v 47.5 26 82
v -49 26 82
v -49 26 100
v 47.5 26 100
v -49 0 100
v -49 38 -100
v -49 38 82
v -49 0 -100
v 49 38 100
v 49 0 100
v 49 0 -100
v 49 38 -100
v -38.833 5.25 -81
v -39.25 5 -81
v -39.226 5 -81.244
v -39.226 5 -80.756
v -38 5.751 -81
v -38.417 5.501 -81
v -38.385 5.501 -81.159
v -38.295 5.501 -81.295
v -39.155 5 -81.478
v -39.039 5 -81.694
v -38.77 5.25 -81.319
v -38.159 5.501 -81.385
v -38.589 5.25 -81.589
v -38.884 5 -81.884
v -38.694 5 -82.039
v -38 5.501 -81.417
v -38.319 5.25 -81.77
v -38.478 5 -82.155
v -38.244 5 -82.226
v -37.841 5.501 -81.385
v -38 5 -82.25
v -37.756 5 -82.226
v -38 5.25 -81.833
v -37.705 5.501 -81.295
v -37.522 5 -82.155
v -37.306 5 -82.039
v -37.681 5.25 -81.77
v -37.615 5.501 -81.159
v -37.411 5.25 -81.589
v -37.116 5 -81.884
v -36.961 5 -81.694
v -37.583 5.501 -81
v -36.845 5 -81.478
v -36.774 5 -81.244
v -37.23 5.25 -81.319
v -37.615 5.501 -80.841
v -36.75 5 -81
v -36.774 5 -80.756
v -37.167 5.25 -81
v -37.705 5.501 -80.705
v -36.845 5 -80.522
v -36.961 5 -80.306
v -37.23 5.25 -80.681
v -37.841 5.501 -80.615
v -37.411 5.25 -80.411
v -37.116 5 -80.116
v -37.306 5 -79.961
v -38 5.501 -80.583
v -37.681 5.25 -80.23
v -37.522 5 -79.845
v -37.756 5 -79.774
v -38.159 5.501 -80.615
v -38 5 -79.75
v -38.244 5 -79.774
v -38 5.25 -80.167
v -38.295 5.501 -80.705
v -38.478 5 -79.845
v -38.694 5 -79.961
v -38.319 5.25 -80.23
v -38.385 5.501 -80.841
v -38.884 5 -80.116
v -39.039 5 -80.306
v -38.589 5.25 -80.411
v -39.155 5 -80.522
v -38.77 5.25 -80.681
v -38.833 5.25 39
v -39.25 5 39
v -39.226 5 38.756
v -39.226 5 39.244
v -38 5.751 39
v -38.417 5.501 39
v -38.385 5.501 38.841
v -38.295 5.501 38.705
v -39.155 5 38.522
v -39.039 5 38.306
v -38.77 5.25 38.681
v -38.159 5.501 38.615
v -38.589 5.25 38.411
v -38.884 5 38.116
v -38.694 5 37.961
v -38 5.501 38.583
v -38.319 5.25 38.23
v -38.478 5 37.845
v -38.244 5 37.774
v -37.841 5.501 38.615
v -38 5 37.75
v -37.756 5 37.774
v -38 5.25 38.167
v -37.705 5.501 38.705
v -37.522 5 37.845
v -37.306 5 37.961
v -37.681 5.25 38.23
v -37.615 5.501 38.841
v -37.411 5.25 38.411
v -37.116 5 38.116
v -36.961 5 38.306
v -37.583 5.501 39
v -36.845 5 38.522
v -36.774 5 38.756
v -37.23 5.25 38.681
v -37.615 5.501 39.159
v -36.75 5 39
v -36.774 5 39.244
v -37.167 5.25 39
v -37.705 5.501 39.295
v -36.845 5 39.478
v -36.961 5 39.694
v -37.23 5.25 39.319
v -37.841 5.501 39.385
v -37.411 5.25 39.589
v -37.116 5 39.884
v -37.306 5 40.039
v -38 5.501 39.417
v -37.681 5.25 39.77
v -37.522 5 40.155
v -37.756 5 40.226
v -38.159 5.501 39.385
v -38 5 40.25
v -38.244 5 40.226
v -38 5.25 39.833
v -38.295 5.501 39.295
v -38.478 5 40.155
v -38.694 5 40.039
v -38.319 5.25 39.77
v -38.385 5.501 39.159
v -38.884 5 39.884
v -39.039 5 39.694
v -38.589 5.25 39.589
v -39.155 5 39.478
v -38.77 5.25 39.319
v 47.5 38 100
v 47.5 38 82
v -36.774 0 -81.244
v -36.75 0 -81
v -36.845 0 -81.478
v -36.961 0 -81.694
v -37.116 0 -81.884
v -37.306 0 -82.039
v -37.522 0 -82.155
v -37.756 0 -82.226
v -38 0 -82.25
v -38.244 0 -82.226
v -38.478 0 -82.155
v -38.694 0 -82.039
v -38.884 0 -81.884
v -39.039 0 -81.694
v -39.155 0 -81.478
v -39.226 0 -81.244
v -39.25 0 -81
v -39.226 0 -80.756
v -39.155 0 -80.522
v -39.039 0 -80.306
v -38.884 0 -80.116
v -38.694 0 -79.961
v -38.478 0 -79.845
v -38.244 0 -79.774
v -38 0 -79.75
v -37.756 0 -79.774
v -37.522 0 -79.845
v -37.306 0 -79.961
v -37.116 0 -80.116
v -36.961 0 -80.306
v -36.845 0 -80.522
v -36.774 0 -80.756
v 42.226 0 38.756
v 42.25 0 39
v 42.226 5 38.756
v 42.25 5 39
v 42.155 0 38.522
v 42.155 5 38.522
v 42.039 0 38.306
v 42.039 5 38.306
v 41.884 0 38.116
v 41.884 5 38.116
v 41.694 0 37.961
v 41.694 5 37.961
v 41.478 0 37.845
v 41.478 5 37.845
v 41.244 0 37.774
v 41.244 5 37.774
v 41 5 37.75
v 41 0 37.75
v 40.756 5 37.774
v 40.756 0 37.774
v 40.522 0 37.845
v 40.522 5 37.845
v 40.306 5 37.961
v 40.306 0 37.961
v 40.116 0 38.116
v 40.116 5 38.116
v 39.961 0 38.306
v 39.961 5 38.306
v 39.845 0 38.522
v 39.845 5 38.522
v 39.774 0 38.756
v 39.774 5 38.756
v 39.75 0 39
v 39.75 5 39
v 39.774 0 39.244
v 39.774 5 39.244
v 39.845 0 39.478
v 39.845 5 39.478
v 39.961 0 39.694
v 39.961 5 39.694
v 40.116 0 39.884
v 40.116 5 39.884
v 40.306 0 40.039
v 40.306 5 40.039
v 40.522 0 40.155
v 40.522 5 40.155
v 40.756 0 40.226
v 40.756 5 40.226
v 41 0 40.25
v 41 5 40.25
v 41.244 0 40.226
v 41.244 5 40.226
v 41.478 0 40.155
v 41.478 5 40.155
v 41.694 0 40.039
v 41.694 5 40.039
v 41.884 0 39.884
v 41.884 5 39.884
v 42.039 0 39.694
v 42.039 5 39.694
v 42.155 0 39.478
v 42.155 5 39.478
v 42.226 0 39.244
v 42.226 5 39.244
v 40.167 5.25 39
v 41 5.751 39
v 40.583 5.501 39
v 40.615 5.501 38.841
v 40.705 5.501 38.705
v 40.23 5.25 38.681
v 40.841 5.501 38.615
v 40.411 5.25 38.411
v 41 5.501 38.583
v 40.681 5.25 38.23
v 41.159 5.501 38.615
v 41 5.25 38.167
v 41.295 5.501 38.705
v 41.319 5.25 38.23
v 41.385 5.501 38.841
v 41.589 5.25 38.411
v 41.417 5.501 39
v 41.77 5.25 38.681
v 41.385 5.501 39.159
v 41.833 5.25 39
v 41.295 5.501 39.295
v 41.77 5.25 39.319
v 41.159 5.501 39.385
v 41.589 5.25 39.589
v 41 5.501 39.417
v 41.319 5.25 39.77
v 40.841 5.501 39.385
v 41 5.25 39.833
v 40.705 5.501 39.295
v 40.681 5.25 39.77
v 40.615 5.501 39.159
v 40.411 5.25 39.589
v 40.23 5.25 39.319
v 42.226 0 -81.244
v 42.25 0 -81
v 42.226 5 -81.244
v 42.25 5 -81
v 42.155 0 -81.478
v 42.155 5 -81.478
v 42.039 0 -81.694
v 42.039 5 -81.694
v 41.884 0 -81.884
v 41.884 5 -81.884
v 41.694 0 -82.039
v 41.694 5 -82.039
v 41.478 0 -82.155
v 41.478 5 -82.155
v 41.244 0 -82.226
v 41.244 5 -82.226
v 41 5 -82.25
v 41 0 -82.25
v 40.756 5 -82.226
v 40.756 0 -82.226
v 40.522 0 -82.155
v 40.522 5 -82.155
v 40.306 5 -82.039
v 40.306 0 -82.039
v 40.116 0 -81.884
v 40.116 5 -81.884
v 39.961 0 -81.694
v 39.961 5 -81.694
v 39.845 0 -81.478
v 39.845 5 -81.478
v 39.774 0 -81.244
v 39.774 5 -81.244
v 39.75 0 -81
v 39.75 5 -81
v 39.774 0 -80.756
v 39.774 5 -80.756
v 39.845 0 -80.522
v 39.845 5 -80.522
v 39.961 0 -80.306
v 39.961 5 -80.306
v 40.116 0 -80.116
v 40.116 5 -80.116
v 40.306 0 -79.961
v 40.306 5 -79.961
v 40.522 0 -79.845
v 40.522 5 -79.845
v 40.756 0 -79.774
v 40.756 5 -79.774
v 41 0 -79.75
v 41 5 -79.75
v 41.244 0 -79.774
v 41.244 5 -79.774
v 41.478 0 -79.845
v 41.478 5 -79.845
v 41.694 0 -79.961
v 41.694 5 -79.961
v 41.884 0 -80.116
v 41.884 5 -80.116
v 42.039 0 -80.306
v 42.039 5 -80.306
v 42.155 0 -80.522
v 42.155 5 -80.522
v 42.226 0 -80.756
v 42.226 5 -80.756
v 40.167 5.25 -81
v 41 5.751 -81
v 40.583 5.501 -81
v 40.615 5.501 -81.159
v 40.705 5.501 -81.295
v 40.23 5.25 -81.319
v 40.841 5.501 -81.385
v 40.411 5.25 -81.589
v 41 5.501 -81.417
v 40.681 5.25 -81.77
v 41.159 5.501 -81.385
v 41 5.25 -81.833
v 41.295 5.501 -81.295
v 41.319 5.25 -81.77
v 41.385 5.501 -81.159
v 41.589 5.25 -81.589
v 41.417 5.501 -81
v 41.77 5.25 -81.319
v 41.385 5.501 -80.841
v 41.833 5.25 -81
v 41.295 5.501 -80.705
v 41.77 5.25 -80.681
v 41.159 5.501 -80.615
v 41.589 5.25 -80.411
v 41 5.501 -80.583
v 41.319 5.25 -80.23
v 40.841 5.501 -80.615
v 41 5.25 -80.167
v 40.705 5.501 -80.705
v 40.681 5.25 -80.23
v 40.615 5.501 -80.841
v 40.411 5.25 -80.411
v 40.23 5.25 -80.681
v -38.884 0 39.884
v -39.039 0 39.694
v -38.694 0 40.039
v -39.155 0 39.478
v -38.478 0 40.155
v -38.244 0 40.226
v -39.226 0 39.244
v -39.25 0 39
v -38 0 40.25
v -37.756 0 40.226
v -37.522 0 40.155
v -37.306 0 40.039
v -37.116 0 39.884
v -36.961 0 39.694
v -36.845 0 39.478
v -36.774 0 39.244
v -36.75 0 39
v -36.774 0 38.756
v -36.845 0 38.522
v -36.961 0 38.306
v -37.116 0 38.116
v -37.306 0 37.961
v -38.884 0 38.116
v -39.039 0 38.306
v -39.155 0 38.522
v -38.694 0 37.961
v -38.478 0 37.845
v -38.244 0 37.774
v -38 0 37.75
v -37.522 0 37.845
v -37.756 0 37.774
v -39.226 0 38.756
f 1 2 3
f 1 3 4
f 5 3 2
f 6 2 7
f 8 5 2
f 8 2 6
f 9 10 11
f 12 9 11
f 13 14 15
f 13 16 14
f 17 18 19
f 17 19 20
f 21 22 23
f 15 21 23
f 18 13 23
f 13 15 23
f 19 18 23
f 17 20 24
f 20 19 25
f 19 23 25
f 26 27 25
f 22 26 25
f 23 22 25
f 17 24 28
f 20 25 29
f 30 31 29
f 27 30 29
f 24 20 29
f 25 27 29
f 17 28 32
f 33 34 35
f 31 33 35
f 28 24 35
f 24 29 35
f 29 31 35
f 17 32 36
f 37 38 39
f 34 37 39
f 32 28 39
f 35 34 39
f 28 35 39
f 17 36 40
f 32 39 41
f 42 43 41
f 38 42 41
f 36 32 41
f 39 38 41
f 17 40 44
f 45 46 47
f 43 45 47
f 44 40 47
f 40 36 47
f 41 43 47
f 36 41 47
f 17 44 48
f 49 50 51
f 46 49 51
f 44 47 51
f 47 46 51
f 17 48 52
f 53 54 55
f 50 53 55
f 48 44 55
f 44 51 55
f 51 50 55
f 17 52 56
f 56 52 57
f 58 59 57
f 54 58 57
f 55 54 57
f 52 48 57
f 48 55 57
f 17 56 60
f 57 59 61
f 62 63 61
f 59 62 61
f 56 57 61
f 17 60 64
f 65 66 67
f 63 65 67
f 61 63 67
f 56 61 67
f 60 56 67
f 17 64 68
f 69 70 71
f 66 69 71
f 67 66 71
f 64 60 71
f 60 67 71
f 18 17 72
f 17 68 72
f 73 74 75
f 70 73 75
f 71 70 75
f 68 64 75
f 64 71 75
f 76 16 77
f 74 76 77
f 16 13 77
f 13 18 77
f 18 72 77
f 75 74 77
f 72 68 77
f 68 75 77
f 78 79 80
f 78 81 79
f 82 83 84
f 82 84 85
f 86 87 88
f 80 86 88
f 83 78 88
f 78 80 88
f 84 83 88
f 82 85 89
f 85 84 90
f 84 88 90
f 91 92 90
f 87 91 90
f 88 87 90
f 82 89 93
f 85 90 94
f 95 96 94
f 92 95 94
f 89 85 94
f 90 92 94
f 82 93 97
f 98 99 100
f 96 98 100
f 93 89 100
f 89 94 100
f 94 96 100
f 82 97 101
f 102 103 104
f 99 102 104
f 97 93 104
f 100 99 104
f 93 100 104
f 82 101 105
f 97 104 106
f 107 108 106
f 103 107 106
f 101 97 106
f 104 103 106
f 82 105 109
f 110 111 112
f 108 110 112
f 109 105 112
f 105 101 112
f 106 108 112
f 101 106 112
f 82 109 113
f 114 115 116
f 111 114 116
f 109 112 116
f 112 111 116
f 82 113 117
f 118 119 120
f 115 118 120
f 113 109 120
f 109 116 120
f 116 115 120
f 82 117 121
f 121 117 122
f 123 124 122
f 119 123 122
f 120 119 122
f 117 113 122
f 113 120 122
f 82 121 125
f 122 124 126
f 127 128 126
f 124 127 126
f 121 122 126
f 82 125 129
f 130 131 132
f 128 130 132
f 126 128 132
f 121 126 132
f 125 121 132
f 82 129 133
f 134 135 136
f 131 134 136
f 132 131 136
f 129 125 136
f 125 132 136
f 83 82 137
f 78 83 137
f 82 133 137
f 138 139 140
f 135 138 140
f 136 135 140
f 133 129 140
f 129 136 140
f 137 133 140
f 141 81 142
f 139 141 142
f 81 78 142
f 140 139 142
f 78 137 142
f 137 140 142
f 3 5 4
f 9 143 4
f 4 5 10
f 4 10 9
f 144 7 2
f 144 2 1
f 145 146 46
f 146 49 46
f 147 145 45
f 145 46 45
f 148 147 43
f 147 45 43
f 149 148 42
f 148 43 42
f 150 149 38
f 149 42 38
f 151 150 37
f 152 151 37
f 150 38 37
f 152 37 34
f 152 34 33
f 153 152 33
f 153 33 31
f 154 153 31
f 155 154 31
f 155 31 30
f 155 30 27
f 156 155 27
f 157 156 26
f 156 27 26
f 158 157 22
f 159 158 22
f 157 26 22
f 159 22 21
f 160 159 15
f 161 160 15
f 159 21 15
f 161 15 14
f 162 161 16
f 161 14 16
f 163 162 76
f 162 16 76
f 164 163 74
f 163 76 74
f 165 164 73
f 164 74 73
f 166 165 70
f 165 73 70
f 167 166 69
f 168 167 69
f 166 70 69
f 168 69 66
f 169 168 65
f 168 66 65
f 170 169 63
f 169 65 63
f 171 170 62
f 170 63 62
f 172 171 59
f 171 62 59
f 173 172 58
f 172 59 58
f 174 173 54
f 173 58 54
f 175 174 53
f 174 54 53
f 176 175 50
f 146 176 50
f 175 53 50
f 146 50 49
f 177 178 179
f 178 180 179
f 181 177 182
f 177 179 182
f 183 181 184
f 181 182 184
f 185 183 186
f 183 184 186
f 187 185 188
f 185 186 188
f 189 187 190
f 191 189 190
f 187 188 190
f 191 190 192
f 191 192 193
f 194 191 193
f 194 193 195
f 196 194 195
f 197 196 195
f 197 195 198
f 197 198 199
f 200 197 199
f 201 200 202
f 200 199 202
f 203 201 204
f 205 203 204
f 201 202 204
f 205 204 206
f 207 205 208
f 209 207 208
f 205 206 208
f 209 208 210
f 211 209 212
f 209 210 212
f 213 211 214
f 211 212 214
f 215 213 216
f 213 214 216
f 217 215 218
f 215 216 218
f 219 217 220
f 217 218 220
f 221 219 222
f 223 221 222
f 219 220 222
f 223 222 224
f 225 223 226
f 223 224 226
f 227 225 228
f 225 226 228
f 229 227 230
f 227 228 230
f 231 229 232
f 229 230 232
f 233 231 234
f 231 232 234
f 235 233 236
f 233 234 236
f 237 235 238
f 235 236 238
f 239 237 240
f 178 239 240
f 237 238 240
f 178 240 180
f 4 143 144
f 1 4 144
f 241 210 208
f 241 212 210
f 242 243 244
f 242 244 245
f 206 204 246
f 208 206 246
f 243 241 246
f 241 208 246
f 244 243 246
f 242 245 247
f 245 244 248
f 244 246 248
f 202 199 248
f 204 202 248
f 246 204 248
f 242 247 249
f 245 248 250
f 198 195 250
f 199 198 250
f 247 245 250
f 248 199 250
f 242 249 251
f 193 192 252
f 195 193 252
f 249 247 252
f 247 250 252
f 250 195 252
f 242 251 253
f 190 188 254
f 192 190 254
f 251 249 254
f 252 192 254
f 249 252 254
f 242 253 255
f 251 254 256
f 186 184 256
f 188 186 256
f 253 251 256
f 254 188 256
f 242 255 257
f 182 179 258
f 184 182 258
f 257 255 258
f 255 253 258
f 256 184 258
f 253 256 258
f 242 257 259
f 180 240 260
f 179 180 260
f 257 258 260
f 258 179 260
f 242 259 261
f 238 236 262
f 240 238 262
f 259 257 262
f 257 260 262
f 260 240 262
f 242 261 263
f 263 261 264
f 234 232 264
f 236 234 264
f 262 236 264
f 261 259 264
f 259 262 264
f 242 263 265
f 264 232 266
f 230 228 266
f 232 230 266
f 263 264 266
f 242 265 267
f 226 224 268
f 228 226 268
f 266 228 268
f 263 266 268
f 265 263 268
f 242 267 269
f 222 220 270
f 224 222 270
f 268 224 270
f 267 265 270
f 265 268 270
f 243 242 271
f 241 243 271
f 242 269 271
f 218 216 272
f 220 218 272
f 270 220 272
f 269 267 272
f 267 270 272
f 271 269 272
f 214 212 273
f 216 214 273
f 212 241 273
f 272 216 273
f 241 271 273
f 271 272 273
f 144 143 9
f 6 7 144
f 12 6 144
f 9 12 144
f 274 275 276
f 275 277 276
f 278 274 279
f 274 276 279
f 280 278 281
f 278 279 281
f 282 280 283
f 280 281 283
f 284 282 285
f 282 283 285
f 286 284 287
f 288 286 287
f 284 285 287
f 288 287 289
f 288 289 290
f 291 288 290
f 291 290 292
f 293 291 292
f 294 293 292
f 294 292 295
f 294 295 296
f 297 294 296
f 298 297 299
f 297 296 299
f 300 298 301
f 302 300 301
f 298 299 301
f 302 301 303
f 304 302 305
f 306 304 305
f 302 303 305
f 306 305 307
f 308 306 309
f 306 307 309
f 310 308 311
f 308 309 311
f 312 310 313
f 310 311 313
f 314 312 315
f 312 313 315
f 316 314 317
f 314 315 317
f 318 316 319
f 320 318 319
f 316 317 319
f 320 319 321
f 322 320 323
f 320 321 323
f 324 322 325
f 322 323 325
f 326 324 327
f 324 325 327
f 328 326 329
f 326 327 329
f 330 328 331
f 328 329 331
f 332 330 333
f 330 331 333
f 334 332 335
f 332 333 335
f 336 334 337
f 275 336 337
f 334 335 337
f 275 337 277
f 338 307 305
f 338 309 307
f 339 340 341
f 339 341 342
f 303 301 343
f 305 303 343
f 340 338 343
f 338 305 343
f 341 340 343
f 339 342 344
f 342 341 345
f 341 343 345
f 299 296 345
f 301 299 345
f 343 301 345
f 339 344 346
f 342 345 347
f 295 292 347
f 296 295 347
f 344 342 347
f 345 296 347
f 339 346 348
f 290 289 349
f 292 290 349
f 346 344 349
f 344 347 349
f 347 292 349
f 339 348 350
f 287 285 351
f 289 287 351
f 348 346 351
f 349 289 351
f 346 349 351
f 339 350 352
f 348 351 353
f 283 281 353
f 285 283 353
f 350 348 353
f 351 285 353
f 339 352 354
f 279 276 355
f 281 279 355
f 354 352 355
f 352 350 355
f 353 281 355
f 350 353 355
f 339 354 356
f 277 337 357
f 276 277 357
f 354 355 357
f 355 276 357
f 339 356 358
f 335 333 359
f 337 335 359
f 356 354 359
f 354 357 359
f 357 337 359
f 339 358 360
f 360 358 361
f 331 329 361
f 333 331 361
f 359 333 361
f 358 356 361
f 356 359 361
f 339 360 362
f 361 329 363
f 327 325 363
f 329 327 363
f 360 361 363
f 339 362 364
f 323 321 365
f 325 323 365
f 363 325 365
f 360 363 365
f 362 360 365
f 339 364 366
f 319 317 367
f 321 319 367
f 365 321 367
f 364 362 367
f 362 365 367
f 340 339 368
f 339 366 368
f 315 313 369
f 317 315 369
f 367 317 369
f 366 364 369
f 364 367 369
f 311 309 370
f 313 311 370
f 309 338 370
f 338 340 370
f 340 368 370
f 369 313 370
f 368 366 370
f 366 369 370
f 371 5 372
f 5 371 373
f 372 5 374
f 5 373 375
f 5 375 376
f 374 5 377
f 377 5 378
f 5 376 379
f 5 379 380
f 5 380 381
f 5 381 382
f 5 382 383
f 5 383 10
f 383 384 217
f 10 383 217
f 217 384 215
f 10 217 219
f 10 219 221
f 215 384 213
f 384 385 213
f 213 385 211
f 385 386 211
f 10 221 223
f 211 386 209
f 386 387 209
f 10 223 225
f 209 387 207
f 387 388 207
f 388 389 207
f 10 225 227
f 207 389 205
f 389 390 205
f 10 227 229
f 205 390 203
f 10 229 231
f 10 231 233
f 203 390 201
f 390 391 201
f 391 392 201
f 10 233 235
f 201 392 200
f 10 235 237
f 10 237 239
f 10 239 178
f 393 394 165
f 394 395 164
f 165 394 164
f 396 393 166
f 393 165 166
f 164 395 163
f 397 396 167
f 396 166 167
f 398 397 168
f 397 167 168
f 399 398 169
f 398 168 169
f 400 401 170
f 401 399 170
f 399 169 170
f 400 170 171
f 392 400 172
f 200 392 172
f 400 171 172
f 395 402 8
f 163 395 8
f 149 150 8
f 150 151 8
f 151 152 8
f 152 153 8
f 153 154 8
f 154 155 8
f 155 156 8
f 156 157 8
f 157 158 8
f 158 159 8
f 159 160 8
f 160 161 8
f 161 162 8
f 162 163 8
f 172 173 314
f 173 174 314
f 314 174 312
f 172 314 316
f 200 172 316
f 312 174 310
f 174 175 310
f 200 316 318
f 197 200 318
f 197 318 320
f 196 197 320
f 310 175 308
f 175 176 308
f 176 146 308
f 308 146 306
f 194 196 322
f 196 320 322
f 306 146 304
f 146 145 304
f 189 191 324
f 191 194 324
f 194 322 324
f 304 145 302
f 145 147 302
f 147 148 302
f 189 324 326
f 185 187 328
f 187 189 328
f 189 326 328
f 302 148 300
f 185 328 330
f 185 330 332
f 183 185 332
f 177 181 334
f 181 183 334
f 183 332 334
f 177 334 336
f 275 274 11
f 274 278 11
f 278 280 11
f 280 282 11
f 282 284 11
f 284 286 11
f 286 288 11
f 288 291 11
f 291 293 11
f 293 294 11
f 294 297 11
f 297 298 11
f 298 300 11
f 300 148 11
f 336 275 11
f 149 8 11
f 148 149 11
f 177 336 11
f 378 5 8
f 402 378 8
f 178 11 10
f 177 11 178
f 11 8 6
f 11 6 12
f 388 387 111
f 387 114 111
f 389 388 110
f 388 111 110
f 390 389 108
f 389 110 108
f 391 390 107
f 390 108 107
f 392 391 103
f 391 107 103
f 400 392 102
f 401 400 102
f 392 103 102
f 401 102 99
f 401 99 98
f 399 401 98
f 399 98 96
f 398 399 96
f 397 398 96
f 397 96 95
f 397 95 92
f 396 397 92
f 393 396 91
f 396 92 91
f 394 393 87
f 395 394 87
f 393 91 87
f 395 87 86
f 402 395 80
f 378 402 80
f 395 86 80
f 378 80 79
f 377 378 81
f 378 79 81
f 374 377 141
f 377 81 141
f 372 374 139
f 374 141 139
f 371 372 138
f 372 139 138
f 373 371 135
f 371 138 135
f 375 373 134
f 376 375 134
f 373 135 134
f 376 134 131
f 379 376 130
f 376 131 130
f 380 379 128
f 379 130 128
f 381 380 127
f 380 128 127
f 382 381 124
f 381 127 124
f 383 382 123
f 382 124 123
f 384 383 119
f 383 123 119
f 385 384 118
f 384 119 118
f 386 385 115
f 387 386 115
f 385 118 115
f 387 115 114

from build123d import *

# Parameters (mm, degrees)
SKETCH_1_W             = 98
SKETCH_1_H             = 200
EXTRUDE_275_DEPTH      = 38
SKETCH_2_W             = 96.5
SKETCH_2_H             = 18
CUT_EXTRUDE_1_DEPTH    = 12
HOLE_WIZARD_M3_1_D     = 2.5
HOLE_WIZARD_M3_1_DEPTH = 5
HOLE_WIZARD_M3_1_TIP   = 0.751075774


with BuildPart() as part:
    # 草图1 → Extrude 275 (new body)
    with BuildSketch(Plane(origin=(0, 0, 0), x_dir=(1, 0, 0), z_dir=(0, 1, 0))):
        Rectangle(SKETCH_1_W, SKETCH_1_H)
    extrude(amount=EXTRUDE_275_DEPTH)

    # 草图2 → 切除-拉伸1 (cut)
    with BuildSketch(Plane(origin=(0, 38, 0), x_dir=(1, 0, 0), z_dir=(0, 1, 0))):
        with Locations((-0.75, -91)):
            Rectangle(SKETCH_2_W, SKETCH_2_H)
    extrude(amount=-CUT_EXTRUDE_1_DEPTH, mode=Mode.SUBTRACT)

    # M3 螺纹孔的螺纹孔钻头1
    with Locations(Plane(origin=(0, 0, 0), x_dir=(-1, 0, 0), z_dir=(0, -1, 0))):
        with Locations((38, -39), (-41, -39), (38, 81), (-41, 81)):
            Hole(HOLE_WIZARD_M3_1_D / 2, depth=HOLE_WIZARD_M3_1_DEPTH)
            with Locations((0, 0, -(HOLE_WIZARD_M3_1_DEPTH + HOLE_WIZARD_M3_1_TIP / 2))):  # 118° drill point
                Cone(0, HOLE_WIZARD_M3_1_D / 2, HOLE_WIZARD_M3_1_TIP, mode=Mode.SUBTRACT)


solid = part.part
